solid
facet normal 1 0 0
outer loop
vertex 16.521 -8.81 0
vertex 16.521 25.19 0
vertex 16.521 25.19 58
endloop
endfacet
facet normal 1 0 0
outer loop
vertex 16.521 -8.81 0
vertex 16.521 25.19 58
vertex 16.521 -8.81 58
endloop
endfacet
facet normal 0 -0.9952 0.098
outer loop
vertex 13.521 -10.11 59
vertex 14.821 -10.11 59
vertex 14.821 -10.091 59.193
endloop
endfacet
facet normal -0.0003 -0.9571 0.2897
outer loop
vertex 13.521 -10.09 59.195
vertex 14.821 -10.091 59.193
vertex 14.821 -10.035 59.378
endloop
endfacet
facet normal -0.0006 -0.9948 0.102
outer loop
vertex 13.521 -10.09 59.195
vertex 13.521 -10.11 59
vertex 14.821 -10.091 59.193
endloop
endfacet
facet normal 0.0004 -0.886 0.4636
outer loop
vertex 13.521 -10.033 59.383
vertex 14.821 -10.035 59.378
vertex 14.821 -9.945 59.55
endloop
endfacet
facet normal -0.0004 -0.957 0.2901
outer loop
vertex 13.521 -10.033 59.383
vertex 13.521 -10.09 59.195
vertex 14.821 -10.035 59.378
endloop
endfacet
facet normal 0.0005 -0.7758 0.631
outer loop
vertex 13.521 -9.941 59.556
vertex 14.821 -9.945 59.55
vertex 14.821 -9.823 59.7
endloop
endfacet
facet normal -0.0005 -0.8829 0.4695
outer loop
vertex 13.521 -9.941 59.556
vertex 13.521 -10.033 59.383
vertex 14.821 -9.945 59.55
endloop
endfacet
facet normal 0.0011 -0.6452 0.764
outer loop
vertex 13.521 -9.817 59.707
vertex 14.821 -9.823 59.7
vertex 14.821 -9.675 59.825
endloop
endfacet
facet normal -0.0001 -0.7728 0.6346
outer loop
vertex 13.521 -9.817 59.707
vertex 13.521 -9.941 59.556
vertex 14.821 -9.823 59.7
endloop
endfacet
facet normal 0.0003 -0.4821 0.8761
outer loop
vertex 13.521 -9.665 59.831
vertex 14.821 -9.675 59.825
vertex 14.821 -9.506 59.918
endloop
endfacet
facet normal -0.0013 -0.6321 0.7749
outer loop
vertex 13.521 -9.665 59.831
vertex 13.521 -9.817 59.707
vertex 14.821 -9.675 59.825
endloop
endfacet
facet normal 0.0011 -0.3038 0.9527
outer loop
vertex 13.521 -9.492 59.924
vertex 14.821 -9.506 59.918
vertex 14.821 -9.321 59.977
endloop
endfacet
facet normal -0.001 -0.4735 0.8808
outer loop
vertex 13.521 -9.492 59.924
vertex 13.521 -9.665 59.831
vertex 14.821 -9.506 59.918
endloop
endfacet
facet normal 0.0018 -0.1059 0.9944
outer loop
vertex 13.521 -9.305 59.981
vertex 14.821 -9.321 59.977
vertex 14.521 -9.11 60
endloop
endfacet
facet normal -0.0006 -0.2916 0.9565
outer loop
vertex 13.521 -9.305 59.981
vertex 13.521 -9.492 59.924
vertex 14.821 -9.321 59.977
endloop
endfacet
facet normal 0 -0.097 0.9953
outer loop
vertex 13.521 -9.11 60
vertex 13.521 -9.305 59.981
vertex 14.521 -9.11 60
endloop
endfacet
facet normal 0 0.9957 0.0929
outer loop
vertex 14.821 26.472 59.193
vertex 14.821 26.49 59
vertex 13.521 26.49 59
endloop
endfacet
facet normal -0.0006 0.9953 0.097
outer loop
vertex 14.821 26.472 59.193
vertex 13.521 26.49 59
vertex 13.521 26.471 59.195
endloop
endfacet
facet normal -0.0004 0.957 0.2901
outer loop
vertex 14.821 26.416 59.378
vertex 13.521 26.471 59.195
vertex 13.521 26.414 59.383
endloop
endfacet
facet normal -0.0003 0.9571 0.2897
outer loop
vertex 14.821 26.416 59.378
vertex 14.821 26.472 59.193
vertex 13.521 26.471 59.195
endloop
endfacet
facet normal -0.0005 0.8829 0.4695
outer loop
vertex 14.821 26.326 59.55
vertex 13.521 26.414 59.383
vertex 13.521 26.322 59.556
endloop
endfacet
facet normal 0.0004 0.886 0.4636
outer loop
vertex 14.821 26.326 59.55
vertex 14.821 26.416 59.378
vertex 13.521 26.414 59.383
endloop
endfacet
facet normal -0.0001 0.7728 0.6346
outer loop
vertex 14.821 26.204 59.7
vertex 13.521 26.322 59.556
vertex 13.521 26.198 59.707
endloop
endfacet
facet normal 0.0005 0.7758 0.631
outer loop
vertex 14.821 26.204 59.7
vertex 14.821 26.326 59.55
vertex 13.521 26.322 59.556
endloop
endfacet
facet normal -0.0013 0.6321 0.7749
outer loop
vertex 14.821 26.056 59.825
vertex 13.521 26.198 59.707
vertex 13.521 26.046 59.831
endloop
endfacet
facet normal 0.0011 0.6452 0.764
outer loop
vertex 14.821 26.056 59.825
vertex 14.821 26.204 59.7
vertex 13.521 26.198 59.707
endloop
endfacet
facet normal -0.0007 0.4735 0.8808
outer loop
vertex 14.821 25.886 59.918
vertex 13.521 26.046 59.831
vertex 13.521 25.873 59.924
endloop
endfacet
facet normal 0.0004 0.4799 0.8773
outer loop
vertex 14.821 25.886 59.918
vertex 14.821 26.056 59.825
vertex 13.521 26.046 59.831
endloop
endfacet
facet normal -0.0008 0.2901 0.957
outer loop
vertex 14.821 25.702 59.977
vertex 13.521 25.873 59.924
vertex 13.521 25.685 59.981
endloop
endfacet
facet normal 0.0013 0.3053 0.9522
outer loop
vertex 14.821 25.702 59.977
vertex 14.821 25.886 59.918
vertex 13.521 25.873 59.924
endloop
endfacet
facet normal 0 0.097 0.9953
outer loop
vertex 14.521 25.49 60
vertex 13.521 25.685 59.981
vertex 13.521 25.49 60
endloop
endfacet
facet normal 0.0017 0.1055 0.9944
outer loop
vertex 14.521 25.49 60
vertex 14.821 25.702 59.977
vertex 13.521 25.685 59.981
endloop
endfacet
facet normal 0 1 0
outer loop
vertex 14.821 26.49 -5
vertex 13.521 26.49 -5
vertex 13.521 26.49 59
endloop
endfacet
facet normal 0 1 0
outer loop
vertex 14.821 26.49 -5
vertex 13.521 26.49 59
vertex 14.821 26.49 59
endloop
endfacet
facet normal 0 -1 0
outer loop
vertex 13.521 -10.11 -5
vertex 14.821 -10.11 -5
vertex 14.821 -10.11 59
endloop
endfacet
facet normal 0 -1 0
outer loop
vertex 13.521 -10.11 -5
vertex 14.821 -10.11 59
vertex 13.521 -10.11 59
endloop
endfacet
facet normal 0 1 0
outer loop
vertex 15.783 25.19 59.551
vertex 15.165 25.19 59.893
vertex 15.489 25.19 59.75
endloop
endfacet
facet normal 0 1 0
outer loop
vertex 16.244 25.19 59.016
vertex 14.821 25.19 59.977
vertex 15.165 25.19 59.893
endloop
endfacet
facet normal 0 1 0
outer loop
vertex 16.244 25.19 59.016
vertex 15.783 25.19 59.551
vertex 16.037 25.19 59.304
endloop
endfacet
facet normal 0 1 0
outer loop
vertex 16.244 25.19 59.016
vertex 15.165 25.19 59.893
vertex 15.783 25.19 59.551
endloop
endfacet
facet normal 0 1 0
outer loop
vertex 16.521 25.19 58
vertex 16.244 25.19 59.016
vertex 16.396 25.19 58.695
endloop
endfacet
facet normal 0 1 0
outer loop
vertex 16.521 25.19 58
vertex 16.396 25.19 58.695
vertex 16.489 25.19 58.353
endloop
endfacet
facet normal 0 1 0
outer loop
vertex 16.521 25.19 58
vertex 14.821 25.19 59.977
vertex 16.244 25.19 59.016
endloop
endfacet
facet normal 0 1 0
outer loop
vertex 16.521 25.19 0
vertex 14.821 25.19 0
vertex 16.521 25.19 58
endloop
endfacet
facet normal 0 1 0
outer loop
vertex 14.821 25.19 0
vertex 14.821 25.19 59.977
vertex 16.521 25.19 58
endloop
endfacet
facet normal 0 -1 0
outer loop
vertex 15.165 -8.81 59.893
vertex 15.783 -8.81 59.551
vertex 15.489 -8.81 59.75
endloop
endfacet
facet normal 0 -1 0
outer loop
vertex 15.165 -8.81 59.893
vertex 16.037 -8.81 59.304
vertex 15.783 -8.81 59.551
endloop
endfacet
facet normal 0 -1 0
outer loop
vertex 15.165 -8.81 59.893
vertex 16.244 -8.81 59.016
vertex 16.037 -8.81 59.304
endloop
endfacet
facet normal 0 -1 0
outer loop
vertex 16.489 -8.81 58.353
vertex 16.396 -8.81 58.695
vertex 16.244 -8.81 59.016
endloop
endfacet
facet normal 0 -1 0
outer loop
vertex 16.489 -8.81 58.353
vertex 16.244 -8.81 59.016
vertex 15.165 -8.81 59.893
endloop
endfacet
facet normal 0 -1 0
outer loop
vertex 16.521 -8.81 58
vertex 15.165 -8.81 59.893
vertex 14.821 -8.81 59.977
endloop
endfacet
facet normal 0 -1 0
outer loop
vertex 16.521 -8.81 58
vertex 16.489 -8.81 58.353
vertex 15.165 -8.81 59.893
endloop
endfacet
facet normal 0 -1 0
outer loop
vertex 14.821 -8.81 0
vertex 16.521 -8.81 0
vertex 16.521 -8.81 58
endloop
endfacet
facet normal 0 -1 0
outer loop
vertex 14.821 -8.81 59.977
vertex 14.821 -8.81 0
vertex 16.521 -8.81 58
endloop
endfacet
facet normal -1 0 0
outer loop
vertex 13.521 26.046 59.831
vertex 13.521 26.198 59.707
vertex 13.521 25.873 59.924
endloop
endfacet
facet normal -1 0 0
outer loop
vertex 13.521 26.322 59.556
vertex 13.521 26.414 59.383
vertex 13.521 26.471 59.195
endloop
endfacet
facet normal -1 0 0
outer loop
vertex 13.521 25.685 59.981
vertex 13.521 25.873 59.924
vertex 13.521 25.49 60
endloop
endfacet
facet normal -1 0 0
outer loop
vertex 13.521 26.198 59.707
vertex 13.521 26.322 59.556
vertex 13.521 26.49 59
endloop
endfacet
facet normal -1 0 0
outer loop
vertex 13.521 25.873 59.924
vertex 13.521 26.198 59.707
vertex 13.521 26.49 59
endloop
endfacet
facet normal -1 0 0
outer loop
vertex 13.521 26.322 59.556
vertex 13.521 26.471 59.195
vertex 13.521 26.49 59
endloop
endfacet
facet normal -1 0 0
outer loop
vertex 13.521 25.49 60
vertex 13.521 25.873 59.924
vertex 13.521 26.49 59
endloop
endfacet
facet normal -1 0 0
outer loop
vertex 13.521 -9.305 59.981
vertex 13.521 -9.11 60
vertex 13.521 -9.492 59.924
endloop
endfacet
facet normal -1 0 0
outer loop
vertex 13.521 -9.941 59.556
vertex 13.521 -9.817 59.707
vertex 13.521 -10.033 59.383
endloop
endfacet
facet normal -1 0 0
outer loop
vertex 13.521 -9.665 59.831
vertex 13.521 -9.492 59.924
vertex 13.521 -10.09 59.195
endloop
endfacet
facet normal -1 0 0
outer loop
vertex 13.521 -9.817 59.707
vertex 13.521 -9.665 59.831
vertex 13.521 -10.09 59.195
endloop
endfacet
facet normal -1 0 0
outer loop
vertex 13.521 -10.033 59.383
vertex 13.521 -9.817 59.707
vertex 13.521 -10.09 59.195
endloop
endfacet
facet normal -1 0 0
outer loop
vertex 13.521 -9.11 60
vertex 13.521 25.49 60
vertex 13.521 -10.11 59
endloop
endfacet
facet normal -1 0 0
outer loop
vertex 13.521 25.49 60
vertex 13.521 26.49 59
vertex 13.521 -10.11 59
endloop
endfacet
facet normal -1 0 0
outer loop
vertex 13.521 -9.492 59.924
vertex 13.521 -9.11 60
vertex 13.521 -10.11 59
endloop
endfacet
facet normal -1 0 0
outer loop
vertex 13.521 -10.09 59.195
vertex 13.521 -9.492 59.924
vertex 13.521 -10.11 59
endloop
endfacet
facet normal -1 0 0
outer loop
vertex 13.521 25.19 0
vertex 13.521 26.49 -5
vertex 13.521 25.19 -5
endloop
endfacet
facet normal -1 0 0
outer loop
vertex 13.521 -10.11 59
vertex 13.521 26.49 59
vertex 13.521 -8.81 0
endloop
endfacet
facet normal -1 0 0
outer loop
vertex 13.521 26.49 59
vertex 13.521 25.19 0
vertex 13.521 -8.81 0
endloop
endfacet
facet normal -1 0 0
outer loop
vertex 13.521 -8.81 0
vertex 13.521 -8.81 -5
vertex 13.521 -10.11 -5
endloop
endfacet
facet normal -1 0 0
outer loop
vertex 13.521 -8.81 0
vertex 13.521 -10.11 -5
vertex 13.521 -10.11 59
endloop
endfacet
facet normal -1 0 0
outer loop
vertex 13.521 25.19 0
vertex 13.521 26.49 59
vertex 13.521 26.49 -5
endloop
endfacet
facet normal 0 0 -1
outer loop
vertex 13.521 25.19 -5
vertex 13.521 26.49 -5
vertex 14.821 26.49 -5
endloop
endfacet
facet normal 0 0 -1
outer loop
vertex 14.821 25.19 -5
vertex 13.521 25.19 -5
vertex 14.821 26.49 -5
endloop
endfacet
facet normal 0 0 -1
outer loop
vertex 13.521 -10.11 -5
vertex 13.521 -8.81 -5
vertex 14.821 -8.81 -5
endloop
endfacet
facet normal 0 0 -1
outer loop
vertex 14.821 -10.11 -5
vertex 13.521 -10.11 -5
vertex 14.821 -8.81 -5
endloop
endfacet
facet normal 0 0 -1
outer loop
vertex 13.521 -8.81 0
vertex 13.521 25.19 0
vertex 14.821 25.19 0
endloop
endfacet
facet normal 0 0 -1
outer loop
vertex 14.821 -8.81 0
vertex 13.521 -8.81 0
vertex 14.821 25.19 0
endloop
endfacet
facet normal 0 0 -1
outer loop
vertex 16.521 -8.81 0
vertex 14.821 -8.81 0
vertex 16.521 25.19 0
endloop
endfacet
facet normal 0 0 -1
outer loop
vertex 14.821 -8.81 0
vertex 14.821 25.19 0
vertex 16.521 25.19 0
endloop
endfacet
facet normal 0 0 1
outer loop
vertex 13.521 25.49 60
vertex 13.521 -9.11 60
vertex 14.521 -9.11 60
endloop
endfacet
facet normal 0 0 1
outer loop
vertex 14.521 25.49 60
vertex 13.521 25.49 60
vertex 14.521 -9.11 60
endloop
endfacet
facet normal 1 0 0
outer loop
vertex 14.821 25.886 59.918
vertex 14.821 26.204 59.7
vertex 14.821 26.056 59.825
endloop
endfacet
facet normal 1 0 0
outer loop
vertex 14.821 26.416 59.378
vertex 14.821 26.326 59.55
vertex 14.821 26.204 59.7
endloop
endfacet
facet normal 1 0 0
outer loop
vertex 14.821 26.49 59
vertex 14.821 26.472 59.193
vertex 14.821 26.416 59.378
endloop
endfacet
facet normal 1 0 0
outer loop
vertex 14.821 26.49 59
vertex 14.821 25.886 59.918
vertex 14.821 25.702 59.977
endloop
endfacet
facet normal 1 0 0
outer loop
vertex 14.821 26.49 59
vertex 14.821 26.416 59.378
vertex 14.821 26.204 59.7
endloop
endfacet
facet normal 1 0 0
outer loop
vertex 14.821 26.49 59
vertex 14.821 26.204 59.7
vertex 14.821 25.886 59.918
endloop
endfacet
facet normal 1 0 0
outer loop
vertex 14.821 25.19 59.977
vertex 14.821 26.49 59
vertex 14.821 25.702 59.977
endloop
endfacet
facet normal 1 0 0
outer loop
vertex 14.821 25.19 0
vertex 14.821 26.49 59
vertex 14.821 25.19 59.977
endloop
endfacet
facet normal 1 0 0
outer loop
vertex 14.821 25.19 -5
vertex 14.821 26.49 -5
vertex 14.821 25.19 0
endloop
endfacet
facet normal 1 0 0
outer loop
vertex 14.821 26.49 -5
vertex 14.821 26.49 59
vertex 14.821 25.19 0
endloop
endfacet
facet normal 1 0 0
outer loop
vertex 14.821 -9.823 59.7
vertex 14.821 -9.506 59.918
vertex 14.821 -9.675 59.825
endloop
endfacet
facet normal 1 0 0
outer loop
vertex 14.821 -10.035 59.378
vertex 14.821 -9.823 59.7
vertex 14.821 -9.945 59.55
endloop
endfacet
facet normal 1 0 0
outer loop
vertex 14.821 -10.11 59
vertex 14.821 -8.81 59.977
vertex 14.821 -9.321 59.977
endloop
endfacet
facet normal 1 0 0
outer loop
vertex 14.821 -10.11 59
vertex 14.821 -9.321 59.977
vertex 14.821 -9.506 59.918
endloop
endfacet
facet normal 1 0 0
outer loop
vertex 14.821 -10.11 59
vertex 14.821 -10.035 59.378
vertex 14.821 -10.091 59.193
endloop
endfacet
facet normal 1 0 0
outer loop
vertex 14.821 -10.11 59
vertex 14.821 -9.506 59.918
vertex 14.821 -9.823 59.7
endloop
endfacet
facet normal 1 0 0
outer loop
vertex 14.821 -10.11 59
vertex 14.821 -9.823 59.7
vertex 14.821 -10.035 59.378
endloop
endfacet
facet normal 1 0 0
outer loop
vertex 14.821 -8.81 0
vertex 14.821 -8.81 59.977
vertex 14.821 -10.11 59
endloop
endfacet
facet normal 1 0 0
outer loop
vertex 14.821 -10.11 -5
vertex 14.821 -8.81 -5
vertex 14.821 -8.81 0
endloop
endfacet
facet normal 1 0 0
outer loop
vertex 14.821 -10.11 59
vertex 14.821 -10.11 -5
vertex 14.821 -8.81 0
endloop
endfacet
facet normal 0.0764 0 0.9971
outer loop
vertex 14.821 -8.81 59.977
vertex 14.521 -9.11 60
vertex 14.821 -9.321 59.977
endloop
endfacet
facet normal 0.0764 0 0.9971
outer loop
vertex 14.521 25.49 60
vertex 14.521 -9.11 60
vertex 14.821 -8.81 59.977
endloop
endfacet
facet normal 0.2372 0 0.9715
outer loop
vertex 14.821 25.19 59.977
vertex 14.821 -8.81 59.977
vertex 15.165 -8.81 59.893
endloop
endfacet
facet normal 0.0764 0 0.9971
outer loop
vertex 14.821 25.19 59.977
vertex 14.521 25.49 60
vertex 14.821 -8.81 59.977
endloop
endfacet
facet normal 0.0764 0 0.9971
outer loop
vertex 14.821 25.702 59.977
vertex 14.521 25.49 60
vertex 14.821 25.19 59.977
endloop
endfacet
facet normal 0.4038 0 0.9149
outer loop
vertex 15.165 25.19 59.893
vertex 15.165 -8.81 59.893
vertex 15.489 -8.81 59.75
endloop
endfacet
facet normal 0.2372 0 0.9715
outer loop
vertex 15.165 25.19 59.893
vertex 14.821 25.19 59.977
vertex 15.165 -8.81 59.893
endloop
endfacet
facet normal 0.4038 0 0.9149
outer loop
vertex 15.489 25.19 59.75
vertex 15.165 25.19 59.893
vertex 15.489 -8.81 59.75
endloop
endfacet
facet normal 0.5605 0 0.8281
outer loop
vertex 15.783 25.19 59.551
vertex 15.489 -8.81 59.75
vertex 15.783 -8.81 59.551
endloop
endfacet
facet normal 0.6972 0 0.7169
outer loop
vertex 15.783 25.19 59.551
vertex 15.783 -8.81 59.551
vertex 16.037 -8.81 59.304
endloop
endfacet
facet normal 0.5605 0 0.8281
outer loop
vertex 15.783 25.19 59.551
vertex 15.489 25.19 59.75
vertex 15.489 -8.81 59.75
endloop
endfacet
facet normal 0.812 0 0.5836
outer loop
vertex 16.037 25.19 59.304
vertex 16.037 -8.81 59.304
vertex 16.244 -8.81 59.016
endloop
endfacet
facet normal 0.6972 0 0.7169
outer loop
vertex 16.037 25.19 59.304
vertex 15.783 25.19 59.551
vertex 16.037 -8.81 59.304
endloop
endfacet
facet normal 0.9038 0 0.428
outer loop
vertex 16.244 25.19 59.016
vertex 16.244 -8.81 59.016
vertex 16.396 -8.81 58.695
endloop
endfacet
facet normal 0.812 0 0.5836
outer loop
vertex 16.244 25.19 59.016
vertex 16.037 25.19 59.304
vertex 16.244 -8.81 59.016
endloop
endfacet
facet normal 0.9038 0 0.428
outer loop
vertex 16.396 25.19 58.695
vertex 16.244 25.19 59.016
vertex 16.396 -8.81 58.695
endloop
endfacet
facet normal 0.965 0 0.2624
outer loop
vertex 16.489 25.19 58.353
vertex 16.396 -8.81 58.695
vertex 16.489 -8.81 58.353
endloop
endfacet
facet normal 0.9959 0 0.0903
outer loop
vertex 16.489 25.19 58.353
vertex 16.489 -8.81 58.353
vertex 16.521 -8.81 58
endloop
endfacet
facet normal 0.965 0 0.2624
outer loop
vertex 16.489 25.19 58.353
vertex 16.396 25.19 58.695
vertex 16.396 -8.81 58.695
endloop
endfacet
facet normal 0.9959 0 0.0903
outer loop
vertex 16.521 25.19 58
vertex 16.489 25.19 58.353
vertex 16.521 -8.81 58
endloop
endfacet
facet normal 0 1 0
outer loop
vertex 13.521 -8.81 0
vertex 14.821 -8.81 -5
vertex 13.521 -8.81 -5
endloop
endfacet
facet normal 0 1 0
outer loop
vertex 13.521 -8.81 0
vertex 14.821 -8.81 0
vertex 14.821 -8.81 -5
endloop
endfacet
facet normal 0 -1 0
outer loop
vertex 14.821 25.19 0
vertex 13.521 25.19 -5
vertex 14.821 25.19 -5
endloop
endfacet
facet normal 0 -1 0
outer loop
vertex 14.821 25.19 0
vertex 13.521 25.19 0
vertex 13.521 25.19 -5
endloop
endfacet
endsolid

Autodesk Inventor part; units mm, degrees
ref_plane "YZ Plane" through (0, 0, 0) normal (1, 0, 0) x (0, 1, 0)
ref_plane "XZ Plane" through (0, 0, 0) normal (0, 1, 0) x (-1, 0, 0)
ref_plane "XY Plane" through (0, 0, 0) normal (0, 0, 1) x (1, 0, 0)
sketch "Sketch1" plane through (0, 0, 0) normal (0, 0, 1) x (1, 0, 0)
  line L0 (13.5206, 26.4904) -> (14.8206, 26.4904)
  line L1 (14.8206, 26.4904) -> (14.8206, 25.1904)
  line L2 (14.8206, 25.1904) -> (16.5206, 25.1904)
  line L3 (16.5206, -8.8096) -> (14.8206, -8.8096)
  line L4 (14.8206, -8.8096) -> (14.8206, -10.1096)
  line L5 (14.8206, -10.1096) -> (13.5206, -10.1096)
  line L6 (16.5206, 25.1904) -> (16.5206, -8.8096)
  line L7 (13.5206, 25.1904) -> (14.8206, 25.1904)
  line L8 (14.8206, -8.8096) -> (13.5206, -8.8096)
  line L9 (13.5206, 26.4904) -> (13.5206, -10.1096)
  dimension "d2" = 1.3
  dimension "d15" = 3
  dimension "d16" = 1.3
  dimension "d17" = 1.3
  dimension "d18" = 1.3
  dimension "d19" = 34
  dimension "d20" = 36.6
  dimension "d21" = 1.7
extrude "Extrusion1" add sketch "Sketch1" along normal blind 60
extrude "Extrusion2" add sketch "Sketch1" against normal blind 5 contours L0 L1 L7 L9 | L8 L4 L5 L9
fillet "Fillet2" radius 1 2 edges at (14.1706, 26.4904, 60) (14.1706, -10.1096, 60)
fillet "Fillet3" radius 2 1 edges at (16.5206, 8.1904, 60)
properties part number "upper cover_3DPrint"
